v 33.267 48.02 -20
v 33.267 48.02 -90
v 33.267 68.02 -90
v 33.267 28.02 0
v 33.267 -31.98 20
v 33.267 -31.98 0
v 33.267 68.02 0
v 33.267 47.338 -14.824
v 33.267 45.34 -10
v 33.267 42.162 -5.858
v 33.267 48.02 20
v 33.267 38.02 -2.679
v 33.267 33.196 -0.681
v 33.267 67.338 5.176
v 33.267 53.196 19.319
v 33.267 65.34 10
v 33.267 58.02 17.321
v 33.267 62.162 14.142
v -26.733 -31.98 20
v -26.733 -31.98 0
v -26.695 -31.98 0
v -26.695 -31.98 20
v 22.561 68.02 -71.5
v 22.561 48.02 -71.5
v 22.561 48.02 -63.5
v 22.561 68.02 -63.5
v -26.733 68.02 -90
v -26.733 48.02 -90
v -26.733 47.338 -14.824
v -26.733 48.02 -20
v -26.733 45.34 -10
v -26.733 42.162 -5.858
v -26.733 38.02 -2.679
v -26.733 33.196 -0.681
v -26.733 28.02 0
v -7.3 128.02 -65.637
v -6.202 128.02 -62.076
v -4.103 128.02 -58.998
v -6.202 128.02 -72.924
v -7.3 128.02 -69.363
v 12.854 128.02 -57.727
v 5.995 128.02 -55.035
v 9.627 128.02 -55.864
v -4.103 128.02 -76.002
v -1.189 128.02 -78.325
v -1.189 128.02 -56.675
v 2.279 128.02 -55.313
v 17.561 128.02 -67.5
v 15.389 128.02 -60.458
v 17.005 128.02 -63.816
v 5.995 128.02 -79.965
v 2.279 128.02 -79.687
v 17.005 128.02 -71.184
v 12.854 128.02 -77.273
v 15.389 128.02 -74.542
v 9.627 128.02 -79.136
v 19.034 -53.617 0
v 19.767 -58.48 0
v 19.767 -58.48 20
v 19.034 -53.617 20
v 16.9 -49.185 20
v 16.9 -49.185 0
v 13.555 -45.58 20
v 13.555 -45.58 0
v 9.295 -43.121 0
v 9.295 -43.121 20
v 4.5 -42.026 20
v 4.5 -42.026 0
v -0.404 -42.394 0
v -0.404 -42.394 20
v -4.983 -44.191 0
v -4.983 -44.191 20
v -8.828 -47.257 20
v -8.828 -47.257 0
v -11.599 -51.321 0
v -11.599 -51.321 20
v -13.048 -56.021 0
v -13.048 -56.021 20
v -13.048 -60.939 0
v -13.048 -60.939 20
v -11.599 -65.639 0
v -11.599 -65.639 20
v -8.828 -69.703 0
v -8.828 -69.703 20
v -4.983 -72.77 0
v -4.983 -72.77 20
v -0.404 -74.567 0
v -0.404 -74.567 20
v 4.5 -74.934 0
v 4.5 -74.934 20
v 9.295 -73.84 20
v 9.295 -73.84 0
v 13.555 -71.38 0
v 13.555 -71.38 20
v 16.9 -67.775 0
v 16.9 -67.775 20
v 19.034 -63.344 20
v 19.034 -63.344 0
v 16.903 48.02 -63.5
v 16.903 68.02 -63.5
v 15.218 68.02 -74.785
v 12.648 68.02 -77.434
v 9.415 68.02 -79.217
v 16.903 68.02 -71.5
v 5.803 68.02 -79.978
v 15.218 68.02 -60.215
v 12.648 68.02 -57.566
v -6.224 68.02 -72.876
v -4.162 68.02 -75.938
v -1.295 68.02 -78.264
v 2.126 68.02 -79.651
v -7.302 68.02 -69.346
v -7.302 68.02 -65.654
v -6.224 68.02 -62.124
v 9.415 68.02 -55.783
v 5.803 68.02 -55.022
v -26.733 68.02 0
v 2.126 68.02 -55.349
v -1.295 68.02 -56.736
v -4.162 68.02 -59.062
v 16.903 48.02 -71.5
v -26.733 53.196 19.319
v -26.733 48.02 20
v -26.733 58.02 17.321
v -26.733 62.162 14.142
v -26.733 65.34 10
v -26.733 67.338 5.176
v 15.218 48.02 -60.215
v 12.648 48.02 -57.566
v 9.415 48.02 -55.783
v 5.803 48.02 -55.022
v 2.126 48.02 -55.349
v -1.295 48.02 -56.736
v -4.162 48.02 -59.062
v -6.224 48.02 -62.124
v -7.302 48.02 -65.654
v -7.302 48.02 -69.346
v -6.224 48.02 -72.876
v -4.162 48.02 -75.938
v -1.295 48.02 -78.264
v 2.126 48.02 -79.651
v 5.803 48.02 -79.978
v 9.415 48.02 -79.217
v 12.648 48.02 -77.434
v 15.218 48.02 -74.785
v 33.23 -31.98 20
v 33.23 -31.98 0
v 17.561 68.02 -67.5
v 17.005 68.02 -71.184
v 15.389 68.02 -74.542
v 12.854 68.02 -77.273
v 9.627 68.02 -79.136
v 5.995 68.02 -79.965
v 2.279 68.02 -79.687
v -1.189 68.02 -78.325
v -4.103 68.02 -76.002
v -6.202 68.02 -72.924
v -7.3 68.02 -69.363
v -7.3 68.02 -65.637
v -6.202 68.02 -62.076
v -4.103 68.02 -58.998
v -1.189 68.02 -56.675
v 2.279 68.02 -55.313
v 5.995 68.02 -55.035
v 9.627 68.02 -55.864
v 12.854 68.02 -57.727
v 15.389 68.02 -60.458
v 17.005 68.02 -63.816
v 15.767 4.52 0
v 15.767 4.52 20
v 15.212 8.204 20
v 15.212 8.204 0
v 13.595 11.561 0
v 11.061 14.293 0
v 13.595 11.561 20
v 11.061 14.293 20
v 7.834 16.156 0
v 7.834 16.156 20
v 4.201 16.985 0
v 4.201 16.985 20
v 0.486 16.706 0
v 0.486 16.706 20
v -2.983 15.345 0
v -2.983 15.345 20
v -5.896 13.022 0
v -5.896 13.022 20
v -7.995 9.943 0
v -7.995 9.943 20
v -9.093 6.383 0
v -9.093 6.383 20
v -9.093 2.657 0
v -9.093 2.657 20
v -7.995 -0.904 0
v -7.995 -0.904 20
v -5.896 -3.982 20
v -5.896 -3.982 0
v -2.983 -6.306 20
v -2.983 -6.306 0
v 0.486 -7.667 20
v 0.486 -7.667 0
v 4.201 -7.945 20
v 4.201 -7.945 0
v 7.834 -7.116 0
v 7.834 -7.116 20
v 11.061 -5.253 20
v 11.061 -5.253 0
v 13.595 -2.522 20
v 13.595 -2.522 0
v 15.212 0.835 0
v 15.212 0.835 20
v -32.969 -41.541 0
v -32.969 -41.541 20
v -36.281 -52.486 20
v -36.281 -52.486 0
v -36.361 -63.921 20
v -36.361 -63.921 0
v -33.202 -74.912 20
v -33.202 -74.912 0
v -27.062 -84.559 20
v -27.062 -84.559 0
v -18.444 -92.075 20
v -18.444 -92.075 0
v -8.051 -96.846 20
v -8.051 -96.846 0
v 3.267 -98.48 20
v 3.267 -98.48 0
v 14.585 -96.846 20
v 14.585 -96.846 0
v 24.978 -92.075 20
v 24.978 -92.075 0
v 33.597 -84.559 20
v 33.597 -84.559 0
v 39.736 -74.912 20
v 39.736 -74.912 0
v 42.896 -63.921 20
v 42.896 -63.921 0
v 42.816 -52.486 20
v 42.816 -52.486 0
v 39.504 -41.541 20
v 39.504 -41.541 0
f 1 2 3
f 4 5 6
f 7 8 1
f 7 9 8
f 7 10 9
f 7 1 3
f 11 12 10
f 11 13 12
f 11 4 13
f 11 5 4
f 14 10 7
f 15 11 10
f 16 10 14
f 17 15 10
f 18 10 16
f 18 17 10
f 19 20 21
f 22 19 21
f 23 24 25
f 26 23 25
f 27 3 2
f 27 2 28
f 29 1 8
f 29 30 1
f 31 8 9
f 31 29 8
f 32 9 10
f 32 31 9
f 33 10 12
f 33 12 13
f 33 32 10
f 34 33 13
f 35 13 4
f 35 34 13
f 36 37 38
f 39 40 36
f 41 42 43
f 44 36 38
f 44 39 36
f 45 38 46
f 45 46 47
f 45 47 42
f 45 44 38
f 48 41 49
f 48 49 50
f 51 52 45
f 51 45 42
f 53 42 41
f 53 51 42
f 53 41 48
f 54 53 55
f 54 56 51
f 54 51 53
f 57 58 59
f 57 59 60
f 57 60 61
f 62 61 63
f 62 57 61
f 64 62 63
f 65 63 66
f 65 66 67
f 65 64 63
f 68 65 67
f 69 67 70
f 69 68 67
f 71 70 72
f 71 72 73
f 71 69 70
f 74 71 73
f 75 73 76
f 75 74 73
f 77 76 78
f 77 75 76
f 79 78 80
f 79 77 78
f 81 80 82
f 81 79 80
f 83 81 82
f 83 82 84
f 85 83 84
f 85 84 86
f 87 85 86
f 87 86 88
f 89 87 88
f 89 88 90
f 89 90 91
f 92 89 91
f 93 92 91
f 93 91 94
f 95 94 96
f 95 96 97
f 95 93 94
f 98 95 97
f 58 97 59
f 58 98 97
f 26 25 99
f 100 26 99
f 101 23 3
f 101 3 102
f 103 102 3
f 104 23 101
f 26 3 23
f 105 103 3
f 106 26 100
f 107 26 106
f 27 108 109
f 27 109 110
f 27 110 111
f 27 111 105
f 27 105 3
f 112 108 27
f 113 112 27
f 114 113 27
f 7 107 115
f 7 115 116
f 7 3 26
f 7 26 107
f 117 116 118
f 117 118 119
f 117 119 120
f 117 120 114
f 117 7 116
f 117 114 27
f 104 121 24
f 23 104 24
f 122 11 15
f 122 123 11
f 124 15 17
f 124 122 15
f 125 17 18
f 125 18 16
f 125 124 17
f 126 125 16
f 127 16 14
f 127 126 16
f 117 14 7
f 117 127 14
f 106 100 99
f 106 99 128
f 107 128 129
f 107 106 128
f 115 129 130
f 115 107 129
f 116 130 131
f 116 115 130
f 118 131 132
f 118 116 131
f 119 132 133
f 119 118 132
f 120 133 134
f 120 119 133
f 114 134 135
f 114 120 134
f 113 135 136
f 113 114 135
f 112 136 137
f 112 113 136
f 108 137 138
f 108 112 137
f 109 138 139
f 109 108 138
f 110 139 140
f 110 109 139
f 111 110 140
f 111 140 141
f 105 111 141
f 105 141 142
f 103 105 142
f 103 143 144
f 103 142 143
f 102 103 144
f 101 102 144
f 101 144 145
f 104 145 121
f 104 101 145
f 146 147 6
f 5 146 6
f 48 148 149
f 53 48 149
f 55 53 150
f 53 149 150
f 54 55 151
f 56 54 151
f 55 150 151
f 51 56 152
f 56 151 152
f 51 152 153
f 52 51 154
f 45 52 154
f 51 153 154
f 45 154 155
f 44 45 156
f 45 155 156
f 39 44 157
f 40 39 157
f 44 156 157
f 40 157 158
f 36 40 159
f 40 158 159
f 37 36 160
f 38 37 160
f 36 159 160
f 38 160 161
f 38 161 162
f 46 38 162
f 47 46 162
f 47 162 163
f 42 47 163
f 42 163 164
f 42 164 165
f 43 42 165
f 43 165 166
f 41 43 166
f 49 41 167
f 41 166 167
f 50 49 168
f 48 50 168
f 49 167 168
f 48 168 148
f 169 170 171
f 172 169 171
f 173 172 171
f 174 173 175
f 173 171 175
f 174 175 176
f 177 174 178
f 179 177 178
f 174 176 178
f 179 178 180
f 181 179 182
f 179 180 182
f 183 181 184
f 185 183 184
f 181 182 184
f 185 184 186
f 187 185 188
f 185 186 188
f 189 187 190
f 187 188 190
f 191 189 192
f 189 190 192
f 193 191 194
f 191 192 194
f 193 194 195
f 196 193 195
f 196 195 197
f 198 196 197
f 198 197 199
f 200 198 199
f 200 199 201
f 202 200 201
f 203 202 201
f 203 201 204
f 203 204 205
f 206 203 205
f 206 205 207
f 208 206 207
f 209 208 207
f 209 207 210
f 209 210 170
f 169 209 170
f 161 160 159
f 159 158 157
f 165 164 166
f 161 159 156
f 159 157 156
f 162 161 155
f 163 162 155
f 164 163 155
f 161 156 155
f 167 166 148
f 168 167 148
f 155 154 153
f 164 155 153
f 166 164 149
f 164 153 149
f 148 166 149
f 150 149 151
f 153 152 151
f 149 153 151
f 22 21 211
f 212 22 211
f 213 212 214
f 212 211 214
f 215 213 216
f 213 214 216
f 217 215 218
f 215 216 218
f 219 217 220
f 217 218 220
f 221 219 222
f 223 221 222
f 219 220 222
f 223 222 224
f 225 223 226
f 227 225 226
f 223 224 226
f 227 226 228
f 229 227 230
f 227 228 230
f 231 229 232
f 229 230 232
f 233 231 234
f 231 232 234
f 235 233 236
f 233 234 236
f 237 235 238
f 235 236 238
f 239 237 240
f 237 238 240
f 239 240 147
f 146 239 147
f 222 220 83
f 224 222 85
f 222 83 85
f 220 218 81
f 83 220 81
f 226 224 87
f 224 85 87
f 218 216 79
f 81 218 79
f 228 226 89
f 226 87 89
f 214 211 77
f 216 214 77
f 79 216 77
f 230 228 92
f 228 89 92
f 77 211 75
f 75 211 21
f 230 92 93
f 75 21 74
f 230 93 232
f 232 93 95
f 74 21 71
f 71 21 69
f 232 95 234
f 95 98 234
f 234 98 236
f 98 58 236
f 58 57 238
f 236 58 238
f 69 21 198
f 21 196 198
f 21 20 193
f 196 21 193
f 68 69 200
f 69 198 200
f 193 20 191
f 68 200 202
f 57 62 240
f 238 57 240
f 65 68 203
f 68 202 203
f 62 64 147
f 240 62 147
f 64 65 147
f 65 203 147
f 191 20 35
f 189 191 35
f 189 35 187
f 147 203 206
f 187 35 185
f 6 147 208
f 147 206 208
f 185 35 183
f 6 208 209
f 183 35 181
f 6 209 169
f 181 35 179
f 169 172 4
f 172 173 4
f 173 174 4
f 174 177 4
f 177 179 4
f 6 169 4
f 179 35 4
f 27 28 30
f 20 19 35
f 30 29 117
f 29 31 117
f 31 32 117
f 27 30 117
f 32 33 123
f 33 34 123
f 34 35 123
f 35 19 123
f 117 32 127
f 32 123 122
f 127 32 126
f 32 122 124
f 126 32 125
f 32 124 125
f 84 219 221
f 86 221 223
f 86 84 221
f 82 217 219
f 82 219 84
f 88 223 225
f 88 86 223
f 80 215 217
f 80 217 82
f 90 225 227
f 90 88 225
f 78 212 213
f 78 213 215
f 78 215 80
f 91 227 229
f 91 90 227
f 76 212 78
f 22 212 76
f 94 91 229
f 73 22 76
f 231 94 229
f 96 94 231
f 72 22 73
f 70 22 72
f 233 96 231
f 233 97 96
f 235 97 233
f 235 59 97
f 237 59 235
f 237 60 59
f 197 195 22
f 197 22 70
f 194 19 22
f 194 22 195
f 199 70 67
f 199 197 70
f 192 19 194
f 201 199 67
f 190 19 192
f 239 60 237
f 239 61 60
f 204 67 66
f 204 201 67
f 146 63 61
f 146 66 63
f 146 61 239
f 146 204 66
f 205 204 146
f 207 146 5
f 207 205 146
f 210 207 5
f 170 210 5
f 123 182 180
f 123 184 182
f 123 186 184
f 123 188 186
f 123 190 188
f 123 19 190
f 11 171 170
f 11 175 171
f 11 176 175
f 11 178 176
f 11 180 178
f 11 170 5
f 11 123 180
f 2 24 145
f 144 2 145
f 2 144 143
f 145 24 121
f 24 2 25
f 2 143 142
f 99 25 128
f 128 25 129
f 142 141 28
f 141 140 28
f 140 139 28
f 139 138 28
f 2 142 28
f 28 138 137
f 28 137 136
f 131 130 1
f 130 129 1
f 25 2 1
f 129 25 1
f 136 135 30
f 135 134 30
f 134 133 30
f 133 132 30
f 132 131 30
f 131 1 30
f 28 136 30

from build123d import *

# Parameters (mm, degrees)
SKETCH1_R           = 16.5
BOSS_EXTRUDE1_DEPTH = 20
SKETCH2_W           = 60
SKETCH2_H           = 20
BOSS_EXTRUDE3_DEPTH = 90
FILLET2_R           = 20
FILLET3_R           = 20
CUT_EXTRUDE1_DEPTH  = 167.5
SKETCH4_R           = 12.5
CUT_EXTRUDE4_DEPTH  = 25
SKETCH5_R           = 12.5
BOSS_EXTRUDE4_DEPTH = 60


with BuildPart() as part:
    # Sketch1 → Boss-Extrude1 (new body)
    with BuildSketch(Plane.XY):
        with BuildLine():
            Line((33.229803266, -31.98019802), (33.267326733, -31.98019802))
            Line((33.267326733, -31.98019802), (33.267326733, 68.01980198))
            Line((33.267326733, 68.01980198), (-26.732673267, 68.01980198))
            Line((-26.732673267, 68.01980198), (-26.732673267, -31.98019802))
            Line((-26.732673267, -31.98019802), (-26.6951498, -31.98019802))
            ThreePointArc((-26.6951498, -31.98019802), (3.267326733, -98.48019802), (33.229803266, -31.98019802))
        make_face()
        with Locations((3.267326733, -58.48019802)):
            Circle(SKETCH1_R, mode=Mode.SUBTRACT)
    extrude(amount=BOSS_EXTRUDE1_DEPTH)

    # Sketch2 → Boss-Extrude3 (add)
    with BuildSketch(Plane(origin=(0, 0, 0), x_dir=(-1, 0, 0), z_dir=(0, 0, -1))):
        with Locations((-3.267326733, 58.01980198)):
            Rectangle(SKETCH2_W, SKETCH2_H)
    extrude(amount=BOSS_EXTRUDE3_DEPTH)

    # Fillet2
    fillet2_edges = [part.edges().sort_by_distance(p)[0] for p in [
        (3.267326733, 68.01980198, 20),
    ]]
    fillet(fillet2_edges, radius=FILLET2_R)

    # Fillet3
    fillet3_edges = [part.edges().sort_by_distance(p)[0] for p in [
        (3.267326733, 48.01980198, 0),
    ]]
    fillet(fillet3_edges, radius=FILLET3_R)

    # Sketch3 → Cut-Extrude1 (cut, through all)
    with BuildSketch(Plane(origin=(0, 68.01980198, 0), x_dir=(1, 0, 0), z_dir=(0, 1, 0))):
        with BuildLine():
            Line((16.903269484, 71.5), (22.560550202, 71.5))
            Line((22.560550202, 71.5), (22.560550202, 63.5))
            Line((22.560550202, 63.5), (16.903269484, 63.5))
            ThreePointArc((16.903269484, 63.5), (-7.439449798, 67.5), (16.903269484, 71.5))
        make_face()
    extrude(amount=-CUT_EXTRUDE1_DEPTH, mode=Mode.SUBTRACT)

    # Sketch4 → Cut-Extrude4 (cut)
    with BuildSketch(Plane.XY.offset(20)):
        with Locations((3.267326733, 4.51980198)):
            Circle(SKETCH4_R)
    extrude(amount=-CUT_EXTRUDE4_DEPTH, mode=Mode.SUBTRACT)


with BuildPart() as body_2:
    # Sketch5 → Boss-Extrude4 (new body)
    with BuildSketch(Plane(origin=(0, 68.01980198, 0), x_dir=(1, 0, 0), z_dir=(0, 1, 0))):
        with Locations((5.060550202, 67.5)):
            Circle(SKETCH5_R)
    extrude(amount=BOSS_EXTRUDE4_DEPTH)


solid = Compound([part.part, body_2.part])
